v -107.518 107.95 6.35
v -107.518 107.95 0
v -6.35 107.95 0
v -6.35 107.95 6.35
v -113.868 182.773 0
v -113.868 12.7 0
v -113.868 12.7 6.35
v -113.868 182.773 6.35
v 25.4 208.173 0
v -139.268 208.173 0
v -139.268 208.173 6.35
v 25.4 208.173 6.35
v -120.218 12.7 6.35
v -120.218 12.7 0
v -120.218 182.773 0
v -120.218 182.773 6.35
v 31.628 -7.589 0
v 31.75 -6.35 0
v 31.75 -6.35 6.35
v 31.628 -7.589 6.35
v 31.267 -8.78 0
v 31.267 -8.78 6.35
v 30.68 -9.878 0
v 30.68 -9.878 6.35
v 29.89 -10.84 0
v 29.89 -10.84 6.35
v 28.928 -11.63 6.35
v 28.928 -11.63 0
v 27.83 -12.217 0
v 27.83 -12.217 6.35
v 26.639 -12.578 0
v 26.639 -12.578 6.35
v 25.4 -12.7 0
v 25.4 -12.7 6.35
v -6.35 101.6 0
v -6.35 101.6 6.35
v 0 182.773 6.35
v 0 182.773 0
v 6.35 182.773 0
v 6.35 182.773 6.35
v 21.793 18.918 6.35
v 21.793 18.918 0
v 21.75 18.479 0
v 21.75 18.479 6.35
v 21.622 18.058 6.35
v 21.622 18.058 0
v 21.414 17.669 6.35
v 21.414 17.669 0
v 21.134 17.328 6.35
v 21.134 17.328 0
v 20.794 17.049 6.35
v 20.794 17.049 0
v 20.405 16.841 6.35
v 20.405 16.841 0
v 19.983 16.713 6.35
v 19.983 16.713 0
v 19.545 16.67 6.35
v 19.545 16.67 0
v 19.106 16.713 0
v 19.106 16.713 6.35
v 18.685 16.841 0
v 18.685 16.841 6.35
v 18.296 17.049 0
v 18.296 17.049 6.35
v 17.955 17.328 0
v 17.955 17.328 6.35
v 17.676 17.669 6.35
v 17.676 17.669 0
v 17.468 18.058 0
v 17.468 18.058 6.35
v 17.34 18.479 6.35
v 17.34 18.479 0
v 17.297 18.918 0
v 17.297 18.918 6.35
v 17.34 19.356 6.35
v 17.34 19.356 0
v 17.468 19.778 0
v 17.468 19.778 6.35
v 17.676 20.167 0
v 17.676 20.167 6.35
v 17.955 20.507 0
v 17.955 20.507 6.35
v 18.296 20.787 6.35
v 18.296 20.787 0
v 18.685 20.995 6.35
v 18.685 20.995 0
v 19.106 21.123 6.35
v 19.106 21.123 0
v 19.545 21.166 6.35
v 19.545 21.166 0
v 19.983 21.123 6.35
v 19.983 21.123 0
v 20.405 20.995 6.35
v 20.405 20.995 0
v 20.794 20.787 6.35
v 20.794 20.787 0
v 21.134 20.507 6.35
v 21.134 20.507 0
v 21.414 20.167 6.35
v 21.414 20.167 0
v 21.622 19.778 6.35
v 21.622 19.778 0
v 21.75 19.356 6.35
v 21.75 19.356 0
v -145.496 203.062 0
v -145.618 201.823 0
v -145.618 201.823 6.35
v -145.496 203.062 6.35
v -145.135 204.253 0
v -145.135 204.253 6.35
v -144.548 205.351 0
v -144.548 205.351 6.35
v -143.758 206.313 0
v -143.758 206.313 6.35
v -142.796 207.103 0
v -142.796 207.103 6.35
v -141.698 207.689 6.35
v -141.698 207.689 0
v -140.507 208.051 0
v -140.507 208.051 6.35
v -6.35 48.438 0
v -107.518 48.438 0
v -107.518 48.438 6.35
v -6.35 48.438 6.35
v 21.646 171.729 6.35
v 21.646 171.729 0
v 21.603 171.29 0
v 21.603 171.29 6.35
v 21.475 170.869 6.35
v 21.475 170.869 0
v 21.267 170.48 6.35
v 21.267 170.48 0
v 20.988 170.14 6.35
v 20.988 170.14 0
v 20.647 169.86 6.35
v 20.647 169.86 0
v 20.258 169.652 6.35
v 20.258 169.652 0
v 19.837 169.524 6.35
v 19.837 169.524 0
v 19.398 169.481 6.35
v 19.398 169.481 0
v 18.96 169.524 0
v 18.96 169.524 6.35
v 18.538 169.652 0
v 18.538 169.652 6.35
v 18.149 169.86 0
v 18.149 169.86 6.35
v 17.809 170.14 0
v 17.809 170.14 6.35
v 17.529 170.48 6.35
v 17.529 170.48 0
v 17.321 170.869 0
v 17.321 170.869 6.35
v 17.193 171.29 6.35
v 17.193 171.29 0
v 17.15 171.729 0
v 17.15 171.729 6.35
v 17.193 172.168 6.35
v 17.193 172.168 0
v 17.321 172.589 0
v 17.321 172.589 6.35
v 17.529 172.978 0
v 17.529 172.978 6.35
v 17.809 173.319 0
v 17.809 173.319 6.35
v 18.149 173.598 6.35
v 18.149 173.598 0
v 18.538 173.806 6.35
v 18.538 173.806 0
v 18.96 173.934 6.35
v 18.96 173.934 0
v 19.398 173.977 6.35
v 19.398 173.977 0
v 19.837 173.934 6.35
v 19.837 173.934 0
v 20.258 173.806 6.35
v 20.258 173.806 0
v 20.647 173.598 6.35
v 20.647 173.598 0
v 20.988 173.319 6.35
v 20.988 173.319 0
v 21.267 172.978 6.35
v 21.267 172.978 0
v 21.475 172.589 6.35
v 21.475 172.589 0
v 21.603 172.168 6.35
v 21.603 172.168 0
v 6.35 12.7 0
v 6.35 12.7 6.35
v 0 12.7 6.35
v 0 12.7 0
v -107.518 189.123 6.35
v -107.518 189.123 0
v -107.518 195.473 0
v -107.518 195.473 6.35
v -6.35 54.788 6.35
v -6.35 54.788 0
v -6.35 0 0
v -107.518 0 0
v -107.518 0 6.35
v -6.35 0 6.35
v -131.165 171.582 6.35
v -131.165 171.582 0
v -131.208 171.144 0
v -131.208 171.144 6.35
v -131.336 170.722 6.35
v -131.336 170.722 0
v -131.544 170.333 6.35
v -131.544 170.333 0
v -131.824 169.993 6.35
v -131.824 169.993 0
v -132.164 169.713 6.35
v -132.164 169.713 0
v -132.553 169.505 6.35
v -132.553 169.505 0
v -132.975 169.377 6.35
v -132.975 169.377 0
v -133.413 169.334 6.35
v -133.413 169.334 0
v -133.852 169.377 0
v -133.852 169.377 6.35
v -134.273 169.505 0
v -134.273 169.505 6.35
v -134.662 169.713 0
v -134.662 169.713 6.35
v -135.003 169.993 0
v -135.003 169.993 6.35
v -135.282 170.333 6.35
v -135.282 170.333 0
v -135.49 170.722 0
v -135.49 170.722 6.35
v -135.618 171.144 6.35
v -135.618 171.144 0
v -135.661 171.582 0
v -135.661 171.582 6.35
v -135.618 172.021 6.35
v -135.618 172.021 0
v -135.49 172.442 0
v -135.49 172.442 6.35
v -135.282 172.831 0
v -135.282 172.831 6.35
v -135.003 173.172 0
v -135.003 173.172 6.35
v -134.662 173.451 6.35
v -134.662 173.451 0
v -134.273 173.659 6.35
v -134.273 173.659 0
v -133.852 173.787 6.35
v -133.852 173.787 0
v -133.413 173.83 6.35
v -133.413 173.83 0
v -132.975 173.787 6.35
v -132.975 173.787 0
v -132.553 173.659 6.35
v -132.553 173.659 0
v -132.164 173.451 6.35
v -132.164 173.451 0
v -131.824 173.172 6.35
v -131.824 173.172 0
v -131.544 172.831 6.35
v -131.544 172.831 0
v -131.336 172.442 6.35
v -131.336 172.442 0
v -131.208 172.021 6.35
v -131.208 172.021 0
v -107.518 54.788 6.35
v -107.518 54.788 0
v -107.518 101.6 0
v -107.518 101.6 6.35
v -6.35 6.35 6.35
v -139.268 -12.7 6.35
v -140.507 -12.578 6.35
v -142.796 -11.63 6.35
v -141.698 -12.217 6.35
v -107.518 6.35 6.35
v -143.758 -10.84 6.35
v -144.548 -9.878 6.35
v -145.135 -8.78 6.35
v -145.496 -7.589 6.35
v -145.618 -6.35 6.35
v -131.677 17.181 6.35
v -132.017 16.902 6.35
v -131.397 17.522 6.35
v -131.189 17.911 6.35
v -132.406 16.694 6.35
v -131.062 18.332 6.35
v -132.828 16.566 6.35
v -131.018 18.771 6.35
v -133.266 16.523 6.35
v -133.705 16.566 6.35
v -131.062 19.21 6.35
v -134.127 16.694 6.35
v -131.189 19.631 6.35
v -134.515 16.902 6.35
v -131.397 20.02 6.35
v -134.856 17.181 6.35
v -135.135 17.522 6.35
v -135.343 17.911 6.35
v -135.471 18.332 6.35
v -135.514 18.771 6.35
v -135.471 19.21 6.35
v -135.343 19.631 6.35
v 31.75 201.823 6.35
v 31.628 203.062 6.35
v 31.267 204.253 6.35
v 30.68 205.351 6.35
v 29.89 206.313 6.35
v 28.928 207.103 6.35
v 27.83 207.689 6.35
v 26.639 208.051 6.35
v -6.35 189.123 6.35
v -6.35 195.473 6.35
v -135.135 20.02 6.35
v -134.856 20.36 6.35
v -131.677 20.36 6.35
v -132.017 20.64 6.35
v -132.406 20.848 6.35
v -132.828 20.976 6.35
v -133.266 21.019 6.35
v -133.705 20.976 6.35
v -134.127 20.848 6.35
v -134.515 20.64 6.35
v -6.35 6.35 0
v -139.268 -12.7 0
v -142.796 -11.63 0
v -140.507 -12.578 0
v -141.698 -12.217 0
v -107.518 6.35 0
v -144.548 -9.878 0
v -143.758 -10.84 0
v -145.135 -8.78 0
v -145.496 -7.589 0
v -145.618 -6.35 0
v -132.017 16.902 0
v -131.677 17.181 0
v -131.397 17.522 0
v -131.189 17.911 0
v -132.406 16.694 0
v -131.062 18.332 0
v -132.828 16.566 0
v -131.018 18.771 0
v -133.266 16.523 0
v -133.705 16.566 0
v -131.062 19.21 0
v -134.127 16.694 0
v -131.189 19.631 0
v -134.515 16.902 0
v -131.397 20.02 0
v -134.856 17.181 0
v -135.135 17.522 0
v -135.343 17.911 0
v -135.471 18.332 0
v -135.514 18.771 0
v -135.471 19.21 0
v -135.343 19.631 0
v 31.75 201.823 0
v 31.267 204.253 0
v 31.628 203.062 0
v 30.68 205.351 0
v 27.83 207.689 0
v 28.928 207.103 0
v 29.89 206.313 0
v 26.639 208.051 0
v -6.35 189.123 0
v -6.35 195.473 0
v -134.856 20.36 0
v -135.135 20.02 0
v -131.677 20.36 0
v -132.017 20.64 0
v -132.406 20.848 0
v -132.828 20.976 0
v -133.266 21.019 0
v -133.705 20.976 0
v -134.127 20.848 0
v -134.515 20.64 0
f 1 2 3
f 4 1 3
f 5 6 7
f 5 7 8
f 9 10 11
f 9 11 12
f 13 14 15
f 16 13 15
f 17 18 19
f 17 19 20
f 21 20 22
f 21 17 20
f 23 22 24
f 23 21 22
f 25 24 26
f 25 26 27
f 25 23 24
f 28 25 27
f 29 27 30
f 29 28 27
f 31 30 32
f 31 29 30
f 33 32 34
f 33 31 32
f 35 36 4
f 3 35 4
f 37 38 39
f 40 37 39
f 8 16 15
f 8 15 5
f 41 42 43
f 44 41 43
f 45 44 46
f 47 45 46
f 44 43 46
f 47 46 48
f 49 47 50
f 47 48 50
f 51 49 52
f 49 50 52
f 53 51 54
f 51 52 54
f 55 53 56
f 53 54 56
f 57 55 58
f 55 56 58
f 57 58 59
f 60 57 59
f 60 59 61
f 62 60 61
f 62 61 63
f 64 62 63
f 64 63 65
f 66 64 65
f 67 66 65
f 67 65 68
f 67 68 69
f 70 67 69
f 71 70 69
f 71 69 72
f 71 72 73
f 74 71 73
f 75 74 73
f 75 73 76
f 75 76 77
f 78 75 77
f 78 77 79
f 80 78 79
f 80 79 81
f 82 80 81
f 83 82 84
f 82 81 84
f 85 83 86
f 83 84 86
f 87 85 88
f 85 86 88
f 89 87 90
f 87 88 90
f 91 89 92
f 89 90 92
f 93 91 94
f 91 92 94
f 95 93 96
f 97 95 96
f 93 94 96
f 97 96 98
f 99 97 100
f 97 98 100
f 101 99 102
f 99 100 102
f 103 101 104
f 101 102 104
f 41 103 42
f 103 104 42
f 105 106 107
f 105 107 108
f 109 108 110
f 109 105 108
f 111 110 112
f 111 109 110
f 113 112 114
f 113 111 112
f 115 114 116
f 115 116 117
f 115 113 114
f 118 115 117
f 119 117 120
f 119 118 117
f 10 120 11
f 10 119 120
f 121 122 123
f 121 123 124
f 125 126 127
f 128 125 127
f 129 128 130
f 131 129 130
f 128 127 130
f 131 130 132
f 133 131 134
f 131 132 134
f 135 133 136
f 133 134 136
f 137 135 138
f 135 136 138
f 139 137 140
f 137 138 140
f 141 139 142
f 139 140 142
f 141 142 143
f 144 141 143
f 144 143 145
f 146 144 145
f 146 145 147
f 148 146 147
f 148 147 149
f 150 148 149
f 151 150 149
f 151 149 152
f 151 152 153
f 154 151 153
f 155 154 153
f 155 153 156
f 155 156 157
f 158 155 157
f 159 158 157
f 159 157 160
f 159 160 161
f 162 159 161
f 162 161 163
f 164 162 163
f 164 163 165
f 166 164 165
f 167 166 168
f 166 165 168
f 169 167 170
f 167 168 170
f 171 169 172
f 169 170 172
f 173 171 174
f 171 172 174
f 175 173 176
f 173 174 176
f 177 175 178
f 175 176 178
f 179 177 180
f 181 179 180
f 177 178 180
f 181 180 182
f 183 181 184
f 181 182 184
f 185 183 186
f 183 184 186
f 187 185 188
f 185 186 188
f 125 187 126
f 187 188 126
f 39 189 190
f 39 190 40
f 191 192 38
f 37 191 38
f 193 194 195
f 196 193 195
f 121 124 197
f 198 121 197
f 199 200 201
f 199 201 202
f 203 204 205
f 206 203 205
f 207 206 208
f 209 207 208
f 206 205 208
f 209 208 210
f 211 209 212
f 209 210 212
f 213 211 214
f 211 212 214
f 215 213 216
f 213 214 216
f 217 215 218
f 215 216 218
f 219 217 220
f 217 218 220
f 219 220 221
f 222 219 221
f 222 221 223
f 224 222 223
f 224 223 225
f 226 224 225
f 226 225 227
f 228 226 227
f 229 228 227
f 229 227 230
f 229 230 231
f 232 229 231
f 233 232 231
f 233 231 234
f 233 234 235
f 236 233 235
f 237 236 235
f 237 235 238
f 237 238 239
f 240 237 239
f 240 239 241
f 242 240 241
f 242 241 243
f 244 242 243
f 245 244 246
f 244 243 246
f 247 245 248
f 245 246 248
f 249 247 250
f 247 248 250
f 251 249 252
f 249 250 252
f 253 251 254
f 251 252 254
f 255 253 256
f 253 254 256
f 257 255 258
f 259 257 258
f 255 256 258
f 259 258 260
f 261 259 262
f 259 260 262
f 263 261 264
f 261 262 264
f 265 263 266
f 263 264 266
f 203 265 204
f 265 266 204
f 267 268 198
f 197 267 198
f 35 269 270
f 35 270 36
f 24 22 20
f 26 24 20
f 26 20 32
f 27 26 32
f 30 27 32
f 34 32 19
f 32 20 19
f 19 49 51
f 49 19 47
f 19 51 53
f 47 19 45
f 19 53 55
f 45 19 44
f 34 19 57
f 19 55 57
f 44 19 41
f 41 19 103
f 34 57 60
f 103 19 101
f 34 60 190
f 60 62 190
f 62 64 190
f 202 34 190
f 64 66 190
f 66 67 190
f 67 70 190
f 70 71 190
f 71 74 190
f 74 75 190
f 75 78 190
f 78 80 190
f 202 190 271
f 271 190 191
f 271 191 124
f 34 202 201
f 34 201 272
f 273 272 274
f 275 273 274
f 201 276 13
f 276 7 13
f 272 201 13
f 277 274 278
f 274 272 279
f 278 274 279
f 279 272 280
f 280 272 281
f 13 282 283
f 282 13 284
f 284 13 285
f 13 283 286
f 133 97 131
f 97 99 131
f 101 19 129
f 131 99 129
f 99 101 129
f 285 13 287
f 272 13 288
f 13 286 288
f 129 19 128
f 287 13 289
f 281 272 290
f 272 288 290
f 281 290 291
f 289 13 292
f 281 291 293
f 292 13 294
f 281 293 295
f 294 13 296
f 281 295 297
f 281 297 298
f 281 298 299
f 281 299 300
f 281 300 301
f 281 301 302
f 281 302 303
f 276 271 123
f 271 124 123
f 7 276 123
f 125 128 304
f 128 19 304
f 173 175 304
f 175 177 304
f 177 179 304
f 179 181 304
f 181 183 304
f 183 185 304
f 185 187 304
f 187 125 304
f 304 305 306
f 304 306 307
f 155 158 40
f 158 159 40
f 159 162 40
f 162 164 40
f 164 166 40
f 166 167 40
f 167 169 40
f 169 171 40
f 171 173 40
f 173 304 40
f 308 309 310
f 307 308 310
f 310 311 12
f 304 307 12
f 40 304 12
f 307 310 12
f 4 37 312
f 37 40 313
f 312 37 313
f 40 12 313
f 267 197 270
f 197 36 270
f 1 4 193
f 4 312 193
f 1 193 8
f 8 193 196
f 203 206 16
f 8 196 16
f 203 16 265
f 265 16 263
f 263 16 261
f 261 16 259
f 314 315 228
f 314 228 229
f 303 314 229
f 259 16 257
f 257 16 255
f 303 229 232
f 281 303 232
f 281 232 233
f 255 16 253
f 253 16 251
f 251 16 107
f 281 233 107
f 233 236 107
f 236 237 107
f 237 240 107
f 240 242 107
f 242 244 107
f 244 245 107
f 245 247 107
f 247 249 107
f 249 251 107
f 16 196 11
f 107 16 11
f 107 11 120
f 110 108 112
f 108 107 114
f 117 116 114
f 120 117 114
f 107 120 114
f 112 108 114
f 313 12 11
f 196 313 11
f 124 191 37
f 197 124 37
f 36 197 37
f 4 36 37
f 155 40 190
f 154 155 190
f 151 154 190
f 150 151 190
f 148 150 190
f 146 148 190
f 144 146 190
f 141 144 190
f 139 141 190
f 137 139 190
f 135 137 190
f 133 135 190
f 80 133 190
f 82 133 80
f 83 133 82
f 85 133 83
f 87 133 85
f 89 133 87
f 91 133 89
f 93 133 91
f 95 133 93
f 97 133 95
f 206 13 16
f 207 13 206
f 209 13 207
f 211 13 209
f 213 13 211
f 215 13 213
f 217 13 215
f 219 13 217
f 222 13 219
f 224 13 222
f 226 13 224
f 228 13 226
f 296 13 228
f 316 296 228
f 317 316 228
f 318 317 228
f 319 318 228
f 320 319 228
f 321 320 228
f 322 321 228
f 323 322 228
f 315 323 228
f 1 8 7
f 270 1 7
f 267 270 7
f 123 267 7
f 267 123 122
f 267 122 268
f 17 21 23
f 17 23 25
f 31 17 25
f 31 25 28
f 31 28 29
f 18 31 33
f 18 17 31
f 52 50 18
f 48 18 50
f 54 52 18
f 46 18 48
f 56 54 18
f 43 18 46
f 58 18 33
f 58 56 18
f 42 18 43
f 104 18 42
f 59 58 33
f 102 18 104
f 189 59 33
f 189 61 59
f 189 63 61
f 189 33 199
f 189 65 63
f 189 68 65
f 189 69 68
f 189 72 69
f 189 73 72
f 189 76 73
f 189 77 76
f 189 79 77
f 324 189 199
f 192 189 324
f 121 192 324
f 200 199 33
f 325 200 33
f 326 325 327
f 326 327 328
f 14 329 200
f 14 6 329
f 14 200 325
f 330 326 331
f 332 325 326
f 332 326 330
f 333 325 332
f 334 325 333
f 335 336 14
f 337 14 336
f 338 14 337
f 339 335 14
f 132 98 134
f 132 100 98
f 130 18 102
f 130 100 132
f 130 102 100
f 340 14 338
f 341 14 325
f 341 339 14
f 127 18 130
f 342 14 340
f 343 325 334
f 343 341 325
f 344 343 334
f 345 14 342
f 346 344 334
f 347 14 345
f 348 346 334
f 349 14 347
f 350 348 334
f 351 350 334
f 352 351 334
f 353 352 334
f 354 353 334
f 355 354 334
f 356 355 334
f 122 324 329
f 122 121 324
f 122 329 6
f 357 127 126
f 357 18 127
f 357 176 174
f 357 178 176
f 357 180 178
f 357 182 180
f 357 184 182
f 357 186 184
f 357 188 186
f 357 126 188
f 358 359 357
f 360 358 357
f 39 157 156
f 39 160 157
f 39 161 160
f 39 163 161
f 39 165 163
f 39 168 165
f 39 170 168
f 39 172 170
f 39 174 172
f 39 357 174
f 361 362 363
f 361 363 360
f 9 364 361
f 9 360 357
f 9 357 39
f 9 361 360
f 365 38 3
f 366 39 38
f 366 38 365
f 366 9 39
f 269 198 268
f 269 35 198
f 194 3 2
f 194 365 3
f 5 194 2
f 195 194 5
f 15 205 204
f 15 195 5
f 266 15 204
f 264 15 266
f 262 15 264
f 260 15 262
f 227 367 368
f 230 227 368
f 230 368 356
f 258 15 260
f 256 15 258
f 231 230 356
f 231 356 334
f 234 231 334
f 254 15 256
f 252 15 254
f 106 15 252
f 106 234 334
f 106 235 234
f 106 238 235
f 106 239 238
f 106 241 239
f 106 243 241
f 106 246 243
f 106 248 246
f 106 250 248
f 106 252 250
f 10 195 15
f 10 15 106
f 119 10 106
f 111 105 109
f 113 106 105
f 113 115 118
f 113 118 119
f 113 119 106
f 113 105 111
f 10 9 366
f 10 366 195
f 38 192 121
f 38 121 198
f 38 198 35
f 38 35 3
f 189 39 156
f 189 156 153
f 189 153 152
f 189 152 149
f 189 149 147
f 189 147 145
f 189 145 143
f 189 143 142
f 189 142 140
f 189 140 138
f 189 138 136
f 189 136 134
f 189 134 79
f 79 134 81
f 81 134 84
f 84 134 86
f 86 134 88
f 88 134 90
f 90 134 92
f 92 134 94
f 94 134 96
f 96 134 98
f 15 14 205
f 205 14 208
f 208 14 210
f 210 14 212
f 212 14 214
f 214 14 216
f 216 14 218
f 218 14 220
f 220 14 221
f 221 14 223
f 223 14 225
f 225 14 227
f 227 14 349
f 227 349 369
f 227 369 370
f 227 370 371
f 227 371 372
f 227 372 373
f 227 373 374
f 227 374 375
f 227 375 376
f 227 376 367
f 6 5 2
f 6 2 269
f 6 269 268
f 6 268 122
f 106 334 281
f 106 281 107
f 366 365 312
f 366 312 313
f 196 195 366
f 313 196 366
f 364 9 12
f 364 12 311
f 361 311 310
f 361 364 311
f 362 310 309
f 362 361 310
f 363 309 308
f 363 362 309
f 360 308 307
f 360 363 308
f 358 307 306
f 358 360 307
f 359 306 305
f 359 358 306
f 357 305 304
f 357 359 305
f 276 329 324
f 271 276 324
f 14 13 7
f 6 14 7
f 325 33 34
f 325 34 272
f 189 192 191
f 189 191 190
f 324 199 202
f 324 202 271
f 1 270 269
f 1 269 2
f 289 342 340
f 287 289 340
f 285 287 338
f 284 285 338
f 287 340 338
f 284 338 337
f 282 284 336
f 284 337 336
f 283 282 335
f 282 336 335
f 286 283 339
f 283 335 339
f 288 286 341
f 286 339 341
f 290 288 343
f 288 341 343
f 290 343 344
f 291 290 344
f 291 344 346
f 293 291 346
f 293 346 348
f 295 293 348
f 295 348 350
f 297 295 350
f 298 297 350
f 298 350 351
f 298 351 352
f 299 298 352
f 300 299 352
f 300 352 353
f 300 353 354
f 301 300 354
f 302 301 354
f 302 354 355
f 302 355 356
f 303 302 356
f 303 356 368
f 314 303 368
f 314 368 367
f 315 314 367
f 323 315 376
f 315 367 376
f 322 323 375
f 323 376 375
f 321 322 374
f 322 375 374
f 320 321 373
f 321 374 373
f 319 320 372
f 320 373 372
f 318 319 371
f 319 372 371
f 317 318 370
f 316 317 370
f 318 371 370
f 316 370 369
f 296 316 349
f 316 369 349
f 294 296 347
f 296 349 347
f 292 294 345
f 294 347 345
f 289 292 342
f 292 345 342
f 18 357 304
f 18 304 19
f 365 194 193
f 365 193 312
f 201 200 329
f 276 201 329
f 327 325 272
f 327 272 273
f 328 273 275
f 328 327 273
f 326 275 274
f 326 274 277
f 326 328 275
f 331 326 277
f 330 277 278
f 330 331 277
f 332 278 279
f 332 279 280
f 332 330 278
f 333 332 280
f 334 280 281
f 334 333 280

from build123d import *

# Parameters (mm, degrees)
SKETCH1_W             = 101.1682
SKETCH1_H             = 6.35
SKETCH1_W_2           = 6.35
SKETCH1_H_2           = 170.072742275
BOSS_EXTRUDE1_DEPTH   = 6.35
F_8_CLEARANCE_HOLE1_D = 4.4958


with BuildPart() as part:
    # Sketch1 → Boss-Extrude1 (new body)
    with BuildSketch(Plane.XY):
        with BuildLine():
            Line((25.4, -12.7), (-139.2682, -12.7))
            ThreePointArc((-139.2682, -12.7), (-143.758328061, -10.840128061), (-145.6182, -6.35))
            Line((-145.6182, -6.35), (-145.6182, 201.822742275))
            ThreePointArc((-145.6182, 201.822742275), (-143.758328061, 206.312870335), (-139.2682, 208.172742275))
            Line((-139.2682, 208.172742275), (25.4, 208.172742275))
            ThreePointArc((25.4, 208.172742275), (29.890128061, 206.312870335), (31.75, 201.822742275))
            Line((31.75, 201.822742275), (31.75, -6.35))
            ThreePointArc((31.75, -6.35), (29.890128061, -10.840128061), (25.4, -12.7))
        make_face()
        with Locations((-56.9341, 192.297742275)):
            Rectangle(SKETCH1_W, SKETCH1_H, mode=Mode.SUBTRACT)
        with Locations((3.175, 97.736371138)):
            Rectangle(SKETCH1_W_2, SKETCH1_H_2, mode=Mode.SUBTRACT)
        with Locations((-117.0432, 97.736371138)):
            Rectangle(SKETCH1_W_2, SKETCH1_H_2, mode=Mode.SUBTRACT)
        with Locations((-56.9341, 104.775)):
            Rectangle(SKETCH1_W, SKETCH1_H, mode=Mode.SUBTRACT)
        with Locations((-56.9341, 3.175)):
            Rectangle(SKETCH1_W, SKETCH1_H, mode=Mode.SUBTRACT)
        with Locations((-56.9341, 51.6128)):
            Rectangle(SKETCH1_W, SKETCH1_H, mode=Mode.SUBTRACT)
    extrude(amount=BOSS_EXTRUDE1_DEPTH)

    # #8 Clearance Hole1 (through all)
    with Locations(Plane(origin=(-70.641043598, 181.536765785, 9.525), x_dir=(-1, 0, 0), z_dir=(0, 0, 1))):
        with Locations((62.625233431, 162.765803656), (62.772094273, 9.954588756), (-90.039120627, 9.807727914), (-90.185981469, 162.618942814)):
            Hole(F_8_CLEARANCE_HOLE1_D / 2)


solid = part.part
